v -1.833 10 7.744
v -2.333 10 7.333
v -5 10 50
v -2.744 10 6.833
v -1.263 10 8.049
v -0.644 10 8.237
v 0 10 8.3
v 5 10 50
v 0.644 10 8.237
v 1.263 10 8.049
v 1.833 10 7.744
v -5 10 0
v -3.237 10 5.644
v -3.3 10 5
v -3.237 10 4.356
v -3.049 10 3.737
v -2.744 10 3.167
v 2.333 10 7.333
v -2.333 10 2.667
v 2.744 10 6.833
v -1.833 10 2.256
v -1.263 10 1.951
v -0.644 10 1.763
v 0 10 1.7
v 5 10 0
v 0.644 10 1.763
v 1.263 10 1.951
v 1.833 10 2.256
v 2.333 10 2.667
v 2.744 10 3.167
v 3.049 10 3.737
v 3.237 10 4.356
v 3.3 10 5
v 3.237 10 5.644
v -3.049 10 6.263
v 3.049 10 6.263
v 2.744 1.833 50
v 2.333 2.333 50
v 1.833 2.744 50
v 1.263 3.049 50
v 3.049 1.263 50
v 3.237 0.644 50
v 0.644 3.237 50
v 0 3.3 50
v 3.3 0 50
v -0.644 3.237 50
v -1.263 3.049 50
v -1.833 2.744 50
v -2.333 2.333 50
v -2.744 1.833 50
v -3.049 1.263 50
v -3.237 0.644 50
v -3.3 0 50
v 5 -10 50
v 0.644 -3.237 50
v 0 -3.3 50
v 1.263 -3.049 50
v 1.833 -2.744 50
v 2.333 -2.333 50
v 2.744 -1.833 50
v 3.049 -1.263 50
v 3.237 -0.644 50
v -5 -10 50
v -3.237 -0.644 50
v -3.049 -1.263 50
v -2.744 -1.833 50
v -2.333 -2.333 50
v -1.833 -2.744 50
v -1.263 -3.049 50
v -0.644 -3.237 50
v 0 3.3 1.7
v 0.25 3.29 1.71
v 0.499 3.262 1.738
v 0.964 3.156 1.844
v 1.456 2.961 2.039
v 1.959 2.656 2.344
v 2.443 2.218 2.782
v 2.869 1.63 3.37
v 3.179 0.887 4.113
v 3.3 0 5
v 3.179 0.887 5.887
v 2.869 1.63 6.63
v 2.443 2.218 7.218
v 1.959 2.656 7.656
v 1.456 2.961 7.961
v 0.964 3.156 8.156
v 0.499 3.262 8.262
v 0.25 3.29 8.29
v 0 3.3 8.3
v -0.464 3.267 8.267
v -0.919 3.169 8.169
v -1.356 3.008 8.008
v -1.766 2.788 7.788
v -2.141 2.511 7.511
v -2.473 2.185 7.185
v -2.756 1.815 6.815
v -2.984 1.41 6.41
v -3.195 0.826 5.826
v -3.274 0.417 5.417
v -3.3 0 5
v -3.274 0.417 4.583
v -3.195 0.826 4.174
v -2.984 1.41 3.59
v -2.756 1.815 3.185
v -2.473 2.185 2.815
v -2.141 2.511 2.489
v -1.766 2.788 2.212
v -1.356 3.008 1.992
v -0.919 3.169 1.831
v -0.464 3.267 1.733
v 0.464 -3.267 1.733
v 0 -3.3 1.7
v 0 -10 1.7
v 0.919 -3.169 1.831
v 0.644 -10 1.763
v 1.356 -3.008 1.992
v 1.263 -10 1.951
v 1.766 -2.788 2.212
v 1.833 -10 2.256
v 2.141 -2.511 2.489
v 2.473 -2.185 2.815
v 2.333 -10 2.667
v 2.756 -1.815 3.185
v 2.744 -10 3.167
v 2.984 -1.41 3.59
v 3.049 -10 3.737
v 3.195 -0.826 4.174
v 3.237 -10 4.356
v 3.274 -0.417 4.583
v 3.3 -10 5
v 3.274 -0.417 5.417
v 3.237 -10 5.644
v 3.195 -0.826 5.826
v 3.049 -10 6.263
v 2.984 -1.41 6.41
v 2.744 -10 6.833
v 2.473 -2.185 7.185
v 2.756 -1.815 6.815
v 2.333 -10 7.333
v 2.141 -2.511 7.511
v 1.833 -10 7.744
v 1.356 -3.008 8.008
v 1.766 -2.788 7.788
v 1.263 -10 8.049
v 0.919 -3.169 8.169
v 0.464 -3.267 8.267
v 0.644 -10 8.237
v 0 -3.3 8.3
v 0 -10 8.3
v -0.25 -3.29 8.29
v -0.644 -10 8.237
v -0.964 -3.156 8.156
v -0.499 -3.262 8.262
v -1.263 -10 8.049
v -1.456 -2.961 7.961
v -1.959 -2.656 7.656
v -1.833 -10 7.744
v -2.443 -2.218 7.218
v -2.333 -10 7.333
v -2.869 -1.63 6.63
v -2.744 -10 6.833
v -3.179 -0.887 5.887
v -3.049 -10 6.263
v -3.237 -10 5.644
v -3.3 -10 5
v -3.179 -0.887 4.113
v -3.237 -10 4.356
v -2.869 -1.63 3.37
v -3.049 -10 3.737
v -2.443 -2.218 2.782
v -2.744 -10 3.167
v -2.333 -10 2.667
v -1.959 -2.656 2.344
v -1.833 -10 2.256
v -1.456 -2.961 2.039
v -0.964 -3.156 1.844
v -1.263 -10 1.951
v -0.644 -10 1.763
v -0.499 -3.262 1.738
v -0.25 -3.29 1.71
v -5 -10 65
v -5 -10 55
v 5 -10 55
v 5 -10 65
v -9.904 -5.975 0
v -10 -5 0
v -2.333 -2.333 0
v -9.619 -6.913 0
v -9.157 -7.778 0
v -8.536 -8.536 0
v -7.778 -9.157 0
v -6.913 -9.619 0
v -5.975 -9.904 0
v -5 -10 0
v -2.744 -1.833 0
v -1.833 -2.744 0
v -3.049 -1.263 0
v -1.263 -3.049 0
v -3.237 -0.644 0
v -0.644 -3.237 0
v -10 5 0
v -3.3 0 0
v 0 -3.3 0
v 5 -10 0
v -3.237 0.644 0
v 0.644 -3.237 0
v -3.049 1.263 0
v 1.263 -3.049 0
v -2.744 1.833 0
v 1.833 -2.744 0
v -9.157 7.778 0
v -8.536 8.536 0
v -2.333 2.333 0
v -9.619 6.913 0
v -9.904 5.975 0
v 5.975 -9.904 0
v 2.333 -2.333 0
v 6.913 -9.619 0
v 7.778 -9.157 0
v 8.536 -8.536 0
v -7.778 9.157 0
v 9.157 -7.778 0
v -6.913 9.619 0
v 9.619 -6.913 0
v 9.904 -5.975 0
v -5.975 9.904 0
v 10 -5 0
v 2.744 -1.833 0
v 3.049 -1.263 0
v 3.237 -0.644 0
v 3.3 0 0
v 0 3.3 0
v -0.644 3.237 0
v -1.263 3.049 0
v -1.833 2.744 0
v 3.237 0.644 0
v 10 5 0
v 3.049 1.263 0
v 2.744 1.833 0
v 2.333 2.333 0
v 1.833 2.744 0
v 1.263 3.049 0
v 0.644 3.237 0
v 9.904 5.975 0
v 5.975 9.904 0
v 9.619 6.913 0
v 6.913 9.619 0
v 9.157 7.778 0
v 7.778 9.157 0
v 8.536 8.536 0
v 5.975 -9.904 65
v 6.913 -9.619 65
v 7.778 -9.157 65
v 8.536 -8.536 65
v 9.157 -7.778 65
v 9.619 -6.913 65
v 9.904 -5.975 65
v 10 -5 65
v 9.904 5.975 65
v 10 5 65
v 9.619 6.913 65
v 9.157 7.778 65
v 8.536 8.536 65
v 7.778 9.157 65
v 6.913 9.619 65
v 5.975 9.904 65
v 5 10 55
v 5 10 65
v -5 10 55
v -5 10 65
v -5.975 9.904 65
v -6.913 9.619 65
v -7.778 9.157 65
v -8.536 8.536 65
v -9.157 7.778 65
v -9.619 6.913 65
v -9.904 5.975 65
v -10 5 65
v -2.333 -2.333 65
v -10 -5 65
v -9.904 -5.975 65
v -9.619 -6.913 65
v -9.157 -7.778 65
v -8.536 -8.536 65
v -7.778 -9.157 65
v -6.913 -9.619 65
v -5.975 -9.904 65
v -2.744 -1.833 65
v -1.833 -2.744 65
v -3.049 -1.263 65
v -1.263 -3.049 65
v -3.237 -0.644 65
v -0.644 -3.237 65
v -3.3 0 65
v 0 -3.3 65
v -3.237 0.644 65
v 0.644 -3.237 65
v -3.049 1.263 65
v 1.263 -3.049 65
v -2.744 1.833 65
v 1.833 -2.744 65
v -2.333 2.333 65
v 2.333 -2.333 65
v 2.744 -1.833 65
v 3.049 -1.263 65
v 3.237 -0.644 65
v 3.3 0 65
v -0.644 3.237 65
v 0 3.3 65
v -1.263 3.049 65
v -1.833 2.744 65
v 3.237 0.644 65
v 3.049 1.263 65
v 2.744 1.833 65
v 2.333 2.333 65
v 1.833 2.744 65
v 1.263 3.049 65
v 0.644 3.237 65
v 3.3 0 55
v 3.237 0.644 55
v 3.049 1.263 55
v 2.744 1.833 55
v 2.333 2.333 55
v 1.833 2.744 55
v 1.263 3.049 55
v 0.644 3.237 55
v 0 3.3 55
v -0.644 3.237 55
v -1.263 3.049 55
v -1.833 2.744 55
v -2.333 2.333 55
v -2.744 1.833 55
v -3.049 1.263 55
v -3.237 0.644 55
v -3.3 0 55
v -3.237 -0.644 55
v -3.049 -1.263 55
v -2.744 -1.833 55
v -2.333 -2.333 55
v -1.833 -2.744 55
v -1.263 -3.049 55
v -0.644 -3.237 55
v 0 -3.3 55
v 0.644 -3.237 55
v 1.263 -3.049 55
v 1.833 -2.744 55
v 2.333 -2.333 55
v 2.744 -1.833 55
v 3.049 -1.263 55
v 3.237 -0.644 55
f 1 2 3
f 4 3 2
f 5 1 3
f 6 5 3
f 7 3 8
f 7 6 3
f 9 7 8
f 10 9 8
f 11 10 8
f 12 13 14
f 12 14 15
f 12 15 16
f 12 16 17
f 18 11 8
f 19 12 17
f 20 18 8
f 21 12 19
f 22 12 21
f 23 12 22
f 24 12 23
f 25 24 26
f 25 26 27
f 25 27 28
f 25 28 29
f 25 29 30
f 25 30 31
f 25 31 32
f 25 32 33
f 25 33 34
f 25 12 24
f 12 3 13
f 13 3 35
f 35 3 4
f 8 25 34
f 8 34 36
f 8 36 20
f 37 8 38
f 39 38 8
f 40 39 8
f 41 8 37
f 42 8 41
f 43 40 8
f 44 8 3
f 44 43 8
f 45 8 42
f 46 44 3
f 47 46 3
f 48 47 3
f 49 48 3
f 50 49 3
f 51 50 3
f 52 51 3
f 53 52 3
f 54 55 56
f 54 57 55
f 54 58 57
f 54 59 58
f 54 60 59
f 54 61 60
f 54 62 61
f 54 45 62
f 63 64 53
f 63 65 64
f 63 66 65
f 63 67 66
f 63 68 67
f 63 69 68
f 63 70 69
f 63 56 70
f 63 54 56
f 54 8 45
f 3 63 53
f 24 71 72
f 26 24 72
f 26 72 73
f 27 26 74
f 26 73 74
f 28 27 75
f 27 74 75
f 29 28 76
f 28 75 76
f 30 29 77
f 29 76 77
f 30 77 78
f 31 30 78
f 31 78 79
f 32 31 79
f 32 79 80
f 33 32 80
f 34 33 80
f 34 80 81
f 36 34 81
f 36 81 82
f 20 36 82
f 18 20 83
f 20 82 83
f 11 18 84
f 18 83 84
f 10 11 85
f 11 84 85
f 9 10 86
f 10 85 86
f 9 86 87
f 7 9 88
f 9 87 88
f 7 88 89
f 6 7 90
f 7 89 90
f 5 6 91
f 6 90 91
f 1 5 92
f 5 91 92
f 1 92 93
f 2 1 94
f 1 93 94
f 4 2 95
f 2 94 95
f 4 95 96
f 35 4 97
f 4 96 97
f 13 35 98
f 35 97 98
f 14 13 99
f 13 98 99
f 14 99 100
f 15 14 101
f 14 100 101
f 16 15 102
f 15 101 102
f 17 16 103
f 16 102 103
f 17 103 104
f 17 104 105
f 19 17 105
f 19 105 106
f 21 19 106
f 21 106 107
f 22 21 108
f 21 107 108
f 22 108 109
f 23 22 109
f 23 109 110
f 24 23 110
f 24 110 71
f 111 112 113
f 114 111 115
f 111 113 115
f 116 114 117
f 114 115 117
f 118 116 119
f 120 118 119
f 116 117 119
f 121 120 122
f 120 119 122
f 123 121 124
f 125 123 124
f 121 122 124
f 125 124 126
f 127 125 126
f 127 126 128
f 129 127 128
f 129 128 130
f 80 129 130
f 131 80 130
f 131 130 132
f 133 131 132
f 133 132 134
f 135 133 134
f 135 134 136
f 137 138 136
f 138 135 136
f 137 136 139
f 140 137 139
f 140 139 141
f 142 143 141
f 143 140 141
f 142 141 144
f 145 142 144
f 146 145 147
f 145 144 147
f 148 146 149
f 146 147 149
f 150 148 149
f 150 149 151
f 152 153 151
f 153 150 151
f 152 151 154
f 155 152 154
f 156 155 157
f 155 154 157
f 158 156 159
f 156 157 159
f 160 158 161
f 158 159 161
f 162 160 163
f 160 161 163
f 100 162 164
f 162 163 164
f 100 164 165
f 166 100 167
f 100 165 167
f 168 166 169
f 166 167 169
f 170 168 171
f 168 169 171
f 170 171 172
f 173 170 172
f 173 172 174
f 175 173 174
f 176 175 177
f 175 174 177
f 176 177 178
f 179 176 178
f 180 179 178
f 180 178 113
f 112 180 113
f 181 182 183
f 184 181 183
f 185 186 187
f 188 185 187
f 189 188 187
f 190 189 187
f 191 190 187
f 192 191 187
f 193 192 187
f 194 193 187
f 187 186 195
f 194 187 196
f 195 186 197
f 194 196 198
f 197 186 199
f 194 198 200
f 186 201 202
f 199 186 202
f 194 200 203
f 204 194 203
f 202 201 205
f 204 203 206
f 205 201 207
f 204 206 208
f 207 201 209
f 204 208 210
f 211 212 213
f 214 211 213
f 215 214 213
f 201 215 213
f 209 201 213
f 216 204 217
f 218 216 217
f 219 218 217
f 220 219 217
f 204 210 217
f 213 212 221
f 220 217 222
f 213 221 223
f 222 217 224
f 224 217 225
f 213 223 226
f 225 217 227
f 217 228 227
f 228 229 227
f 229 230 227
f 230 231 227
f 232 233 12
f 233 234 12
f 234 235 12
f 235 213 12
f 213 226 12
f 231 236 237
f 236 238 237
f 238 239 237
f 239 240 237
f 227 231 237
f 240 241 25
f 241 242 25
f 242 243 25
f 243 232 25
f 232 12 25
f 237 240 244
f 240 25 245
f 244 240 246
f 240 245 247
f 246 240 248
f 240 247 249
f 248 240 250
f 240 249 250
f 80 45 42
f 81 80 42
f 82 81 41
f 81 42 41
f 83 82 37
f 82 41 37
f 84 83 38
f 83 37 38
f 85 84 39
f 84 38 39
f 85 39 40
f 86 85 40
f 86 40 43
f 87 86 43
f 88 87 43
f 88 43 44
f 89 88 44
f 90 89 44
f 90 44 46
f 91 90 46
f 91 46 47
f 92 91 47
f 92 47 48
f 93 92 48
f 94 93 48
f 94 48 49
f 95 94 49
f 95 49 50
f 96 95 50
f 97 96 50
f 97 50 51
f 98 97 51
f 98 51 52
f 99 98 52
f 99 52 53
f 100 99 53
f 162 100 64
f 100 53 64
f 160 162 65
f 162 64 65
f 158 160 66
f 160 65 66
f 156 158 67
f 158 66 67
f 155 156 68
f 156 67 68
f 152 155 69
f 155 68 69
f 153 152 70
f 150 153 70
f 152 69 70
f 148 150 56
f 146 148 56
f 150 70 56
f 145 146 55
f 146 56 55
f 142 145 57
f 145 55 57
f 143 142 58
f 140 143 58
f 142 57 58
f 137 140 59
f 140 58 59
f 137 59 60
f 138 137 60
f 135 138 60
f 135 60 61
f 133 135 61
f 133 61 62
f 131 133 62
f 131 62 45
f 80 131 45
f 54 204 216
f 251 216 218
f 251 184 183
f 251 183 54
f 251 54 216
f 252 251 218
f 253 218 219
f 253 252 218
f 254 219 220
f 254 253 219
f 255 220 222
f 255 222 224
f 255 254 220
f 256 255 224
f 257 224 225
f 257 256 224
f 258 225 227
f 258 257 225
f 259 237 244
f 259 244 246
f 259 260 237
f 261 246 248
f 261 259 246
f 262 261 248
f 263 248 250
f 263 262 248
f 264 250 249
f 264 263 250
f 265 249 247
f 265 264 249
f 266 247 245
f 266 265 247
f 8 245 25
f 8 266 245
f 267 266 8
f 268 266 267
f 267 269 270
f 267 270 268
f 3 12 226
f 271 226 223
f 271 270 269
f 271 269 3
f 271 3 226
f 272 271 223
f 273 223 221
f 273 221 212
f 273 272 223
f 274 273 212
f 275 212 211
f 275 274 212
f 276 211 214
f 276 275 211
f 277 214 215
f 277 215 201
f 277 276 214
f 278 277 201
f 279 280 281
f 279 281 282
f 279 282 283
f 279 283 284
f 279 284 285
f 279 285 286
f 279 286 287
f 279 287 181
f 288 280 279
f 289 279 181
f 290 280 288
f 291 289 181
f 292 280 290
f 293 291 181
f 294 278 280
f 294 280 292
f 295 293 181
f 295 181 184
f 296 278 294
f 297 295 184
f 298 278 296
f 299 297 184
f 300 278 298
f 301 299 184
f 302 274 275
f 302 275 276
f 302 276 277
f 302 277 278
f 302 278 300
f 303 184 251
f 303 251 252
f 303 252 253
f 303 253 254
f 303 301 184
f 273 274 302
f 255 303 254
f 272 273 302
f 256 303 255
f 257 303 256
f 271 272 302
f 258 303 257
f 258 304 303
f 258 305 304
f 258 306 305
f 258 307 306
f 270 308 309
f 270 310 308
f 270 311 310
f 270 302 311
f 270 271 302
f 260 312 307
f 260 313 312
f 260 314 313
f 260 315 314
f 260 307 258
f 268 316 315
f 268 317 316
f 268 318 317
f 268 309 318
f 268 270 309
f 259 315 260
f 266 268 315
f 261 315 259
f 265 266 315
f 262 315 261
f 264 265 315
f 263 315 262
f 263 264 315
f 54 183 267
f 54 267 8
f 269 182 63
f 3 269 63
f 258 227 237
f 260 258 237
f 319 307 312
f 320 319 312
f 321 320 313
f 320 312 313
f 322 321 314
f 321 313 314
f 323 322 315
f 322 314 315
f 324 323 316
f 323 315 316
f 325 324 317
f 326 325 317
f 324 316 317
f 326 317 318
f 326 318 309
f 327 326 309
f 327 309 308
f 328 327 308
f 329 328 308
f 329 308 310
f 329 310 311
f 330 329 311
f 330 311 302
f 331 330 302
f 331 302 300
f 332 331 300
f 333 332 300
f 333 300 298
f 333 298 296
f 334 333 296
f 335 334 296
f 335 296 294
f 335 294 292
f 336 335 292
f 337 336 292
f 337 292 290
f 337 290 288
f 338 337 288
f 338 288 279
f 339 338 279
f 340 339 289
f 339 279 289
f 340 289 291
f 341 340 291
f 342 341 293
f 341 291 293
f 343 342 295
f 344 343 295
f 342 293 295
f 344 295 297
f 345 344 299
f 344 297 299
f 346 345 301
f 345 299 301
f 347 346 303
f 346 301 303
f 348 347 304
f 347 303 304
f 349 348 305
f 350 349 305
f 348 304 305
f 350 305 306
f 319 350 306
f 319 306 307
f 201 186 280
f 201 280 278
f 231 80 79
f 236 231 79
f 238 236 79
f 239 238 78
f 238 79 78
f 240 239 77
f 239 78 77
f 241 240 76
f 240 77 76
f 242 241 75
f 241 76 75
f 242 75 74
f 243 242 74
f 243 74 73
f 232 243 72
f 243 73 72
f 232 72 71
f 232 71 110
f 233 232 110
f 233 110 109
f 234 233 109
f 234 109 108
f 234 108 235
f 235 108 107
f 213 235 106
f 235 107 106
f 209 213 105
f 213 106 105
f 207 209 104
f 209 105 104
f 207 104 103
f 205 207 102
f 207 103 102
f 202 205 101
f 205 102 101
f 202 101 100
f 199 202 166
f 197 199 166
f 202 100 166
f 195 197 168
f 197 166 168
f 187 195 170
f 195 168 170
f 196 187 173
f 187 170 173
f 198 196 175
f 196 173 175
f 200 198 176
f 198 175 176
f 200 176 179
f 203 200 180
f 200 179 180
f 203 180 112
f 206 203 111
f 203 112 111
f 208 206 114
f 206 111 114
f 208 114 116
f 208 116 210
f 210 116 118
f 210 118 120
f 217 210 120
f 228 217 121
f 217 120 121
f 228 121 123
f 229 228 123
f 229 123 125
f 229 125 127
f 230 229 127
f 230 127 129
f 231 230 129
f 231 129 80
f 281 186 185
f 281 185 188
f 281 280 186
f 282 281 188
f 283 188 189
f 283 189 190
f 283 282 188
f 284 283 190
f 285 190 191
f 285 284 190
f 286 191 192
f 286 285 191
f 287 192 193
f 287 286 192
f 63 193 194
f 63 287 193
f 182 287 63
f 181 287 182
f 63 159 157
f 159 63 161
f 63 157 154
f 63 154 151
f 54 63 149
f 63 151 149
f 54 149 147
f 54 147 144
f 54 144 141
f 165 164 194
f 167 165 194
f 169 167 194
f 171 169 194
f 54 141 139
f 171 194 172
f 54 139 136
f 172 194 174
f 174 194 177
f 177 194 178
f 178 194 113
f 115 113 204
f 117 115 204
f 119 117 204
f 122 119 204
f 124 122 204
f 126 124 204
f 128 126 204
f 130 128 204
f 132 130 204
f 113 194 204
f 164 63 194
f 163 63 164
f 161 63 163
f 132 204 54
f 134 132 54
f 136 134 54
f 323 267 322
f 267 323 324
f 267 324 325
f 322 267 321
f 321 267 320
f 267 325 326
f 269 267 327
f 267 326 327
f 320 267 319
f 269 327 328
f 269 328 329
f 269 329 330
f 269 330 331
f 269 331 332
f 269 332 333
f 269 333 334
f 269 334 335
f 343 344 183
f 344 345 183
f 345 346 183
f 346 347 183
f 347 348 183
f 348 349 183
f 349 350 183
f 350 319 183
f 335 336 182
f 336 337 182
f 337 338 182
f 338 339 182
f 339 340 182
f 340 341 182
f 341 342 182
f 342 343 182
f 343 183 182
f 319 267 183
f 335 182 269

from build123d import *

# Parameters (mm, degrees)
ESBO_O2_W                = 20
ESBO_O2_H                = 20
RESSALTO_EXTRUS_O1_DEPTH = 65
ESBO_O3_R                = 3.3
CORTE_EXTRUS_O1_DEPTH    = 67.520673478
ESBO_O4_R                = 3.3
CORTE_EXTRUS_O2_DEPTH    = 69.738635424
FILETE1_R                = 5
FILETE2_R                = 5
FILETE3_R                = 5
FILETE4_R                = 5
ESBO_O7_W                = 10
ESBO_O7_H                = 5
CORTE_EXTRUS_O3_DEPTH    = 69.738635424


with BuildPart() as part:
    # Esboço2 → Ressalto-extrusão1 (new body)
    with BuildSketch(Plane.XY):
        Rectangle(ESBO_O2_W, ESBO_O2_H)
    extrude(amount=RESSALTO_EXTRUS_O1_DEPTH)

    # Esboço3 → Corte-extrusão1 (cut, through all)
    with BuildSketch(Plane.XY.offset(65)):
        Circle(ESBO_O3_R)
    extrude(amount=-CORTE_EXTRUS_O1_DEPTH, mode=Mode.SUBTRACT)

    # Esboço4 → Corte-extrusão2 (cut, through all)
    with BuildSketch(Plane(origin=(0, -10, 0), x_dir=(-1, 0, 0), z_dir=(0, -1, 0))):
        with Locations(Location((0, -5, 0), (0, 0, 90))):
            Circle(ESBO_O4_R)
    extrude(amount=-CORTE_EXTRUS_O2_DEPTH, mode=Mode.SUBTRACT)

    # Filete1
    filete1_edges = [part.edges().sort_by_distance(p)[0] for p in [
        (10, -10, 32.5),
    ]]
    fillet(filete1_edges, radius=FILETE1_R)

    # Filete2
    filete2_edges = [part.edges().sort_by_distance(p)[0] for p in [
        (10, 10, 32.5),
    ]]
    fillet(filete2_edges, radius=FILETE2_R)

    # Filete3
    filete3_edges = [part.edges().sort_by_distance(p)[0] for p in [
        (-10, 10, 32.5),
    ]]
    fillet(filete3_edges, radius=FILETE3_R)

    # Filete4
    filete4_edges = [part.edges().sort_by_distance(p)[0] for p in [
        (-10, -10, 32.5),
    ]]
    fillet(filete4_edges, radius=FILETE4_R)

    # Esboço7 → Corte-extrusão3 (cut, through all)
    with BuildSketch(Plane(origin=(0, -10, 0), x_dir=(-1, 0, 0), z_dir=(0, -1, 0))):
        with Locations((0, -52.5)):
            Rectangle(ESBO_O7_W, ESBO_O7_H)
    extrude(amount=-CORTE_EXTRUS_O3_DEPTH, mode=Mode.SUBTRACT)


solid = part.part
